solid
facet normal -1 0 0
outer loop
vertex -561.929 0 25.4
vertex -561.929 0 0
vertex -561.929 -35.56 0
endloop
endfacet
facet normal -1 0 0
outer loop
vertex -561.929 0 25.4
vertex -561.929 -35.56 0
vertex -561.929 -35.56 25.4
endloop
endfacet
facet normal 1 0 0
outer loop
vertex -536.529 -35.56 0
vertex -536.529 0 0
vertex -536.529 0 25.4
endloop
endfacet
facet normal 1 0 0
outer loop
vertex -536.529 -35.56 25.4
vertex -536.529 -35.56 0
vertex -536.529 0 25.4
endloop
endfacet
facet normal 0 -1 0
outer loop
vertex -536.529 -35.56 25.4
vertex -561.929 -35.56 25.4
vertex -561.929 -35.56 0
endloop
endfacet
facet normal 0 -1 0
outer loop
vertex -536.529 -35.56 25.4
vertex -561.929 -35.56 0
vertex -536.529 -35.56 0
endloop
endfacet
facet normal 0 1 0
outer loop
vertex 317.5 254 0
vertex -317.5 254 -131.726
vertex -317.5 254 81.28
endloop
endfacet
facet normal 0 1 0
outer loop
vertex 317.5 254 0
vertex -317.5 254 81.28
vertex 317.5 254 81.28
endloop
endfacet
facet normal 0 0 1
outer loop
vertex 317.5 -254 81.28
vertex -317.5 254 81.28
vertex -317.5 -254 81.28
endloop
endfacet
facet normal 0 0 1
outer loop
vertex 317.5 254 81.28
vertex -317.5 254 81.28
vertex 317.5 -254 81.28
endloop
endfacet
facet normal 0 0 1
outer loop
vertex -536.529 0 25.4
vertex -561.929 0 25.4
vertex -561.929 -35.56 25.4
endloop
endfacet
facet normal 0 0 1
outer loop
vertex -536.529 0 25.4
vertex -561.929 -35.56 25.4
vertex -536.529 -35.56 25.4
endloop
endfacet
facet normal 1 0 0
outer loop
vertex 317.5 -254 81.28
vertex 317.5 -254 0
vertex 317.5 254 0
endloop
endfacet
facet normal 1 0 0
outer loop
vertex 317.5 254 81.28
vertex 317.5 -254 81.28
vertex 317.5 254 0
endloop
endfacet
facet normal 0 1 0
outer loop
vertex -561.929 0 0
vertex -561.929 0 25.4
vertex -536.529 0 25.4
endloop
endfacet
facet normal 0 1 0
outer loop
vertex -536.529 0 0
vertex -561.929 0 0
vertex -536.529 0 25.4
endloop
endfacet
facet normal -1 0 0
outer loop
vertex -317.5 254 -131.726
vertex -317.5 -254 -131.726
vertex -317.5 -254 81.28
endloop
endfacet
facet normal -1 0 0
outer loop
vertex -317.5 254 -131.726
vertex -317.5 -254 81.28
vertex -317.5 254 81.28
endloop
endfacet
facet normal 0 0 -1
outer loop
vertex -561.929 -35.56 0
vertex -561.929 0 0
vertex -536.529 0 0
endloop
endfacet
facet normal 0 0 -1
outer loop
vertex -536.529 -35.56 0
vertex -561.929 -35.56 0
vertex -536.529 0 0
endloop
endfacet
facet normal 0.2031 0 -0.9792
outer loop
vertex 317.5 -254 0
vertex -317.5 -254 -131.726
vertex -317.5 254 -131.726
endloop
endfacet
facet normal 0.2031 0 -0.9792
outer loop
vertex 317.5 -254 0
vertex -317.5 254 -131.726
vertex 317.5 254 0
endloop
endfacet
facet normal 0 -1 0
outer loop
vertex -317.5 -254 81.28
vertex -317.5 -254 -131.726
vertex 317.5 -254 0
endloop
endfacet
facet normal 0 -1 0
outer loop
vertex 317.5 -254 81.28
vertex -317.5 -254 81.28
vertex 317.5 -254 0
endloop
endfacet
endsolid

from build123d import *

# Parameters (mm, degrees)
F0_W     = 635
F0_H     = 508
F1_DEPTH = 81.28
F3_DEPTH = 508
F4_W     = 25.4
F4_H     = 25.4
F5_DEPTH = 35.56


with BuildPart() as f1:
    # F0 (on Top) → F1 (new body)
    with BuildSketch(Plane.XY):
        Rectangle(F0_W, F0_H)
    extrude(amount=F1_DEPTH)

    # F2 (on face) → F3 (join)
    with BuildSketch(Plane.XZ.offset(254)):
        Polygon((317.5, 19.807838), (-317.5, 26.855934), (-317.5, -131.72625), (317.5, 0), align=None)
    extrude(amount=-F3_DEPTH)


with BuildPart() as f5:
    # F4 (on Front) → F5 (new body)
    with BuildSketch(Plane.XZ):
        with Locations((-549.228689, 12.7)):
            Rectangle(F4_W, F4_H)
    extrude(amount=F5_DEPTH)


solid = Compound([f1.part, f5.part])
